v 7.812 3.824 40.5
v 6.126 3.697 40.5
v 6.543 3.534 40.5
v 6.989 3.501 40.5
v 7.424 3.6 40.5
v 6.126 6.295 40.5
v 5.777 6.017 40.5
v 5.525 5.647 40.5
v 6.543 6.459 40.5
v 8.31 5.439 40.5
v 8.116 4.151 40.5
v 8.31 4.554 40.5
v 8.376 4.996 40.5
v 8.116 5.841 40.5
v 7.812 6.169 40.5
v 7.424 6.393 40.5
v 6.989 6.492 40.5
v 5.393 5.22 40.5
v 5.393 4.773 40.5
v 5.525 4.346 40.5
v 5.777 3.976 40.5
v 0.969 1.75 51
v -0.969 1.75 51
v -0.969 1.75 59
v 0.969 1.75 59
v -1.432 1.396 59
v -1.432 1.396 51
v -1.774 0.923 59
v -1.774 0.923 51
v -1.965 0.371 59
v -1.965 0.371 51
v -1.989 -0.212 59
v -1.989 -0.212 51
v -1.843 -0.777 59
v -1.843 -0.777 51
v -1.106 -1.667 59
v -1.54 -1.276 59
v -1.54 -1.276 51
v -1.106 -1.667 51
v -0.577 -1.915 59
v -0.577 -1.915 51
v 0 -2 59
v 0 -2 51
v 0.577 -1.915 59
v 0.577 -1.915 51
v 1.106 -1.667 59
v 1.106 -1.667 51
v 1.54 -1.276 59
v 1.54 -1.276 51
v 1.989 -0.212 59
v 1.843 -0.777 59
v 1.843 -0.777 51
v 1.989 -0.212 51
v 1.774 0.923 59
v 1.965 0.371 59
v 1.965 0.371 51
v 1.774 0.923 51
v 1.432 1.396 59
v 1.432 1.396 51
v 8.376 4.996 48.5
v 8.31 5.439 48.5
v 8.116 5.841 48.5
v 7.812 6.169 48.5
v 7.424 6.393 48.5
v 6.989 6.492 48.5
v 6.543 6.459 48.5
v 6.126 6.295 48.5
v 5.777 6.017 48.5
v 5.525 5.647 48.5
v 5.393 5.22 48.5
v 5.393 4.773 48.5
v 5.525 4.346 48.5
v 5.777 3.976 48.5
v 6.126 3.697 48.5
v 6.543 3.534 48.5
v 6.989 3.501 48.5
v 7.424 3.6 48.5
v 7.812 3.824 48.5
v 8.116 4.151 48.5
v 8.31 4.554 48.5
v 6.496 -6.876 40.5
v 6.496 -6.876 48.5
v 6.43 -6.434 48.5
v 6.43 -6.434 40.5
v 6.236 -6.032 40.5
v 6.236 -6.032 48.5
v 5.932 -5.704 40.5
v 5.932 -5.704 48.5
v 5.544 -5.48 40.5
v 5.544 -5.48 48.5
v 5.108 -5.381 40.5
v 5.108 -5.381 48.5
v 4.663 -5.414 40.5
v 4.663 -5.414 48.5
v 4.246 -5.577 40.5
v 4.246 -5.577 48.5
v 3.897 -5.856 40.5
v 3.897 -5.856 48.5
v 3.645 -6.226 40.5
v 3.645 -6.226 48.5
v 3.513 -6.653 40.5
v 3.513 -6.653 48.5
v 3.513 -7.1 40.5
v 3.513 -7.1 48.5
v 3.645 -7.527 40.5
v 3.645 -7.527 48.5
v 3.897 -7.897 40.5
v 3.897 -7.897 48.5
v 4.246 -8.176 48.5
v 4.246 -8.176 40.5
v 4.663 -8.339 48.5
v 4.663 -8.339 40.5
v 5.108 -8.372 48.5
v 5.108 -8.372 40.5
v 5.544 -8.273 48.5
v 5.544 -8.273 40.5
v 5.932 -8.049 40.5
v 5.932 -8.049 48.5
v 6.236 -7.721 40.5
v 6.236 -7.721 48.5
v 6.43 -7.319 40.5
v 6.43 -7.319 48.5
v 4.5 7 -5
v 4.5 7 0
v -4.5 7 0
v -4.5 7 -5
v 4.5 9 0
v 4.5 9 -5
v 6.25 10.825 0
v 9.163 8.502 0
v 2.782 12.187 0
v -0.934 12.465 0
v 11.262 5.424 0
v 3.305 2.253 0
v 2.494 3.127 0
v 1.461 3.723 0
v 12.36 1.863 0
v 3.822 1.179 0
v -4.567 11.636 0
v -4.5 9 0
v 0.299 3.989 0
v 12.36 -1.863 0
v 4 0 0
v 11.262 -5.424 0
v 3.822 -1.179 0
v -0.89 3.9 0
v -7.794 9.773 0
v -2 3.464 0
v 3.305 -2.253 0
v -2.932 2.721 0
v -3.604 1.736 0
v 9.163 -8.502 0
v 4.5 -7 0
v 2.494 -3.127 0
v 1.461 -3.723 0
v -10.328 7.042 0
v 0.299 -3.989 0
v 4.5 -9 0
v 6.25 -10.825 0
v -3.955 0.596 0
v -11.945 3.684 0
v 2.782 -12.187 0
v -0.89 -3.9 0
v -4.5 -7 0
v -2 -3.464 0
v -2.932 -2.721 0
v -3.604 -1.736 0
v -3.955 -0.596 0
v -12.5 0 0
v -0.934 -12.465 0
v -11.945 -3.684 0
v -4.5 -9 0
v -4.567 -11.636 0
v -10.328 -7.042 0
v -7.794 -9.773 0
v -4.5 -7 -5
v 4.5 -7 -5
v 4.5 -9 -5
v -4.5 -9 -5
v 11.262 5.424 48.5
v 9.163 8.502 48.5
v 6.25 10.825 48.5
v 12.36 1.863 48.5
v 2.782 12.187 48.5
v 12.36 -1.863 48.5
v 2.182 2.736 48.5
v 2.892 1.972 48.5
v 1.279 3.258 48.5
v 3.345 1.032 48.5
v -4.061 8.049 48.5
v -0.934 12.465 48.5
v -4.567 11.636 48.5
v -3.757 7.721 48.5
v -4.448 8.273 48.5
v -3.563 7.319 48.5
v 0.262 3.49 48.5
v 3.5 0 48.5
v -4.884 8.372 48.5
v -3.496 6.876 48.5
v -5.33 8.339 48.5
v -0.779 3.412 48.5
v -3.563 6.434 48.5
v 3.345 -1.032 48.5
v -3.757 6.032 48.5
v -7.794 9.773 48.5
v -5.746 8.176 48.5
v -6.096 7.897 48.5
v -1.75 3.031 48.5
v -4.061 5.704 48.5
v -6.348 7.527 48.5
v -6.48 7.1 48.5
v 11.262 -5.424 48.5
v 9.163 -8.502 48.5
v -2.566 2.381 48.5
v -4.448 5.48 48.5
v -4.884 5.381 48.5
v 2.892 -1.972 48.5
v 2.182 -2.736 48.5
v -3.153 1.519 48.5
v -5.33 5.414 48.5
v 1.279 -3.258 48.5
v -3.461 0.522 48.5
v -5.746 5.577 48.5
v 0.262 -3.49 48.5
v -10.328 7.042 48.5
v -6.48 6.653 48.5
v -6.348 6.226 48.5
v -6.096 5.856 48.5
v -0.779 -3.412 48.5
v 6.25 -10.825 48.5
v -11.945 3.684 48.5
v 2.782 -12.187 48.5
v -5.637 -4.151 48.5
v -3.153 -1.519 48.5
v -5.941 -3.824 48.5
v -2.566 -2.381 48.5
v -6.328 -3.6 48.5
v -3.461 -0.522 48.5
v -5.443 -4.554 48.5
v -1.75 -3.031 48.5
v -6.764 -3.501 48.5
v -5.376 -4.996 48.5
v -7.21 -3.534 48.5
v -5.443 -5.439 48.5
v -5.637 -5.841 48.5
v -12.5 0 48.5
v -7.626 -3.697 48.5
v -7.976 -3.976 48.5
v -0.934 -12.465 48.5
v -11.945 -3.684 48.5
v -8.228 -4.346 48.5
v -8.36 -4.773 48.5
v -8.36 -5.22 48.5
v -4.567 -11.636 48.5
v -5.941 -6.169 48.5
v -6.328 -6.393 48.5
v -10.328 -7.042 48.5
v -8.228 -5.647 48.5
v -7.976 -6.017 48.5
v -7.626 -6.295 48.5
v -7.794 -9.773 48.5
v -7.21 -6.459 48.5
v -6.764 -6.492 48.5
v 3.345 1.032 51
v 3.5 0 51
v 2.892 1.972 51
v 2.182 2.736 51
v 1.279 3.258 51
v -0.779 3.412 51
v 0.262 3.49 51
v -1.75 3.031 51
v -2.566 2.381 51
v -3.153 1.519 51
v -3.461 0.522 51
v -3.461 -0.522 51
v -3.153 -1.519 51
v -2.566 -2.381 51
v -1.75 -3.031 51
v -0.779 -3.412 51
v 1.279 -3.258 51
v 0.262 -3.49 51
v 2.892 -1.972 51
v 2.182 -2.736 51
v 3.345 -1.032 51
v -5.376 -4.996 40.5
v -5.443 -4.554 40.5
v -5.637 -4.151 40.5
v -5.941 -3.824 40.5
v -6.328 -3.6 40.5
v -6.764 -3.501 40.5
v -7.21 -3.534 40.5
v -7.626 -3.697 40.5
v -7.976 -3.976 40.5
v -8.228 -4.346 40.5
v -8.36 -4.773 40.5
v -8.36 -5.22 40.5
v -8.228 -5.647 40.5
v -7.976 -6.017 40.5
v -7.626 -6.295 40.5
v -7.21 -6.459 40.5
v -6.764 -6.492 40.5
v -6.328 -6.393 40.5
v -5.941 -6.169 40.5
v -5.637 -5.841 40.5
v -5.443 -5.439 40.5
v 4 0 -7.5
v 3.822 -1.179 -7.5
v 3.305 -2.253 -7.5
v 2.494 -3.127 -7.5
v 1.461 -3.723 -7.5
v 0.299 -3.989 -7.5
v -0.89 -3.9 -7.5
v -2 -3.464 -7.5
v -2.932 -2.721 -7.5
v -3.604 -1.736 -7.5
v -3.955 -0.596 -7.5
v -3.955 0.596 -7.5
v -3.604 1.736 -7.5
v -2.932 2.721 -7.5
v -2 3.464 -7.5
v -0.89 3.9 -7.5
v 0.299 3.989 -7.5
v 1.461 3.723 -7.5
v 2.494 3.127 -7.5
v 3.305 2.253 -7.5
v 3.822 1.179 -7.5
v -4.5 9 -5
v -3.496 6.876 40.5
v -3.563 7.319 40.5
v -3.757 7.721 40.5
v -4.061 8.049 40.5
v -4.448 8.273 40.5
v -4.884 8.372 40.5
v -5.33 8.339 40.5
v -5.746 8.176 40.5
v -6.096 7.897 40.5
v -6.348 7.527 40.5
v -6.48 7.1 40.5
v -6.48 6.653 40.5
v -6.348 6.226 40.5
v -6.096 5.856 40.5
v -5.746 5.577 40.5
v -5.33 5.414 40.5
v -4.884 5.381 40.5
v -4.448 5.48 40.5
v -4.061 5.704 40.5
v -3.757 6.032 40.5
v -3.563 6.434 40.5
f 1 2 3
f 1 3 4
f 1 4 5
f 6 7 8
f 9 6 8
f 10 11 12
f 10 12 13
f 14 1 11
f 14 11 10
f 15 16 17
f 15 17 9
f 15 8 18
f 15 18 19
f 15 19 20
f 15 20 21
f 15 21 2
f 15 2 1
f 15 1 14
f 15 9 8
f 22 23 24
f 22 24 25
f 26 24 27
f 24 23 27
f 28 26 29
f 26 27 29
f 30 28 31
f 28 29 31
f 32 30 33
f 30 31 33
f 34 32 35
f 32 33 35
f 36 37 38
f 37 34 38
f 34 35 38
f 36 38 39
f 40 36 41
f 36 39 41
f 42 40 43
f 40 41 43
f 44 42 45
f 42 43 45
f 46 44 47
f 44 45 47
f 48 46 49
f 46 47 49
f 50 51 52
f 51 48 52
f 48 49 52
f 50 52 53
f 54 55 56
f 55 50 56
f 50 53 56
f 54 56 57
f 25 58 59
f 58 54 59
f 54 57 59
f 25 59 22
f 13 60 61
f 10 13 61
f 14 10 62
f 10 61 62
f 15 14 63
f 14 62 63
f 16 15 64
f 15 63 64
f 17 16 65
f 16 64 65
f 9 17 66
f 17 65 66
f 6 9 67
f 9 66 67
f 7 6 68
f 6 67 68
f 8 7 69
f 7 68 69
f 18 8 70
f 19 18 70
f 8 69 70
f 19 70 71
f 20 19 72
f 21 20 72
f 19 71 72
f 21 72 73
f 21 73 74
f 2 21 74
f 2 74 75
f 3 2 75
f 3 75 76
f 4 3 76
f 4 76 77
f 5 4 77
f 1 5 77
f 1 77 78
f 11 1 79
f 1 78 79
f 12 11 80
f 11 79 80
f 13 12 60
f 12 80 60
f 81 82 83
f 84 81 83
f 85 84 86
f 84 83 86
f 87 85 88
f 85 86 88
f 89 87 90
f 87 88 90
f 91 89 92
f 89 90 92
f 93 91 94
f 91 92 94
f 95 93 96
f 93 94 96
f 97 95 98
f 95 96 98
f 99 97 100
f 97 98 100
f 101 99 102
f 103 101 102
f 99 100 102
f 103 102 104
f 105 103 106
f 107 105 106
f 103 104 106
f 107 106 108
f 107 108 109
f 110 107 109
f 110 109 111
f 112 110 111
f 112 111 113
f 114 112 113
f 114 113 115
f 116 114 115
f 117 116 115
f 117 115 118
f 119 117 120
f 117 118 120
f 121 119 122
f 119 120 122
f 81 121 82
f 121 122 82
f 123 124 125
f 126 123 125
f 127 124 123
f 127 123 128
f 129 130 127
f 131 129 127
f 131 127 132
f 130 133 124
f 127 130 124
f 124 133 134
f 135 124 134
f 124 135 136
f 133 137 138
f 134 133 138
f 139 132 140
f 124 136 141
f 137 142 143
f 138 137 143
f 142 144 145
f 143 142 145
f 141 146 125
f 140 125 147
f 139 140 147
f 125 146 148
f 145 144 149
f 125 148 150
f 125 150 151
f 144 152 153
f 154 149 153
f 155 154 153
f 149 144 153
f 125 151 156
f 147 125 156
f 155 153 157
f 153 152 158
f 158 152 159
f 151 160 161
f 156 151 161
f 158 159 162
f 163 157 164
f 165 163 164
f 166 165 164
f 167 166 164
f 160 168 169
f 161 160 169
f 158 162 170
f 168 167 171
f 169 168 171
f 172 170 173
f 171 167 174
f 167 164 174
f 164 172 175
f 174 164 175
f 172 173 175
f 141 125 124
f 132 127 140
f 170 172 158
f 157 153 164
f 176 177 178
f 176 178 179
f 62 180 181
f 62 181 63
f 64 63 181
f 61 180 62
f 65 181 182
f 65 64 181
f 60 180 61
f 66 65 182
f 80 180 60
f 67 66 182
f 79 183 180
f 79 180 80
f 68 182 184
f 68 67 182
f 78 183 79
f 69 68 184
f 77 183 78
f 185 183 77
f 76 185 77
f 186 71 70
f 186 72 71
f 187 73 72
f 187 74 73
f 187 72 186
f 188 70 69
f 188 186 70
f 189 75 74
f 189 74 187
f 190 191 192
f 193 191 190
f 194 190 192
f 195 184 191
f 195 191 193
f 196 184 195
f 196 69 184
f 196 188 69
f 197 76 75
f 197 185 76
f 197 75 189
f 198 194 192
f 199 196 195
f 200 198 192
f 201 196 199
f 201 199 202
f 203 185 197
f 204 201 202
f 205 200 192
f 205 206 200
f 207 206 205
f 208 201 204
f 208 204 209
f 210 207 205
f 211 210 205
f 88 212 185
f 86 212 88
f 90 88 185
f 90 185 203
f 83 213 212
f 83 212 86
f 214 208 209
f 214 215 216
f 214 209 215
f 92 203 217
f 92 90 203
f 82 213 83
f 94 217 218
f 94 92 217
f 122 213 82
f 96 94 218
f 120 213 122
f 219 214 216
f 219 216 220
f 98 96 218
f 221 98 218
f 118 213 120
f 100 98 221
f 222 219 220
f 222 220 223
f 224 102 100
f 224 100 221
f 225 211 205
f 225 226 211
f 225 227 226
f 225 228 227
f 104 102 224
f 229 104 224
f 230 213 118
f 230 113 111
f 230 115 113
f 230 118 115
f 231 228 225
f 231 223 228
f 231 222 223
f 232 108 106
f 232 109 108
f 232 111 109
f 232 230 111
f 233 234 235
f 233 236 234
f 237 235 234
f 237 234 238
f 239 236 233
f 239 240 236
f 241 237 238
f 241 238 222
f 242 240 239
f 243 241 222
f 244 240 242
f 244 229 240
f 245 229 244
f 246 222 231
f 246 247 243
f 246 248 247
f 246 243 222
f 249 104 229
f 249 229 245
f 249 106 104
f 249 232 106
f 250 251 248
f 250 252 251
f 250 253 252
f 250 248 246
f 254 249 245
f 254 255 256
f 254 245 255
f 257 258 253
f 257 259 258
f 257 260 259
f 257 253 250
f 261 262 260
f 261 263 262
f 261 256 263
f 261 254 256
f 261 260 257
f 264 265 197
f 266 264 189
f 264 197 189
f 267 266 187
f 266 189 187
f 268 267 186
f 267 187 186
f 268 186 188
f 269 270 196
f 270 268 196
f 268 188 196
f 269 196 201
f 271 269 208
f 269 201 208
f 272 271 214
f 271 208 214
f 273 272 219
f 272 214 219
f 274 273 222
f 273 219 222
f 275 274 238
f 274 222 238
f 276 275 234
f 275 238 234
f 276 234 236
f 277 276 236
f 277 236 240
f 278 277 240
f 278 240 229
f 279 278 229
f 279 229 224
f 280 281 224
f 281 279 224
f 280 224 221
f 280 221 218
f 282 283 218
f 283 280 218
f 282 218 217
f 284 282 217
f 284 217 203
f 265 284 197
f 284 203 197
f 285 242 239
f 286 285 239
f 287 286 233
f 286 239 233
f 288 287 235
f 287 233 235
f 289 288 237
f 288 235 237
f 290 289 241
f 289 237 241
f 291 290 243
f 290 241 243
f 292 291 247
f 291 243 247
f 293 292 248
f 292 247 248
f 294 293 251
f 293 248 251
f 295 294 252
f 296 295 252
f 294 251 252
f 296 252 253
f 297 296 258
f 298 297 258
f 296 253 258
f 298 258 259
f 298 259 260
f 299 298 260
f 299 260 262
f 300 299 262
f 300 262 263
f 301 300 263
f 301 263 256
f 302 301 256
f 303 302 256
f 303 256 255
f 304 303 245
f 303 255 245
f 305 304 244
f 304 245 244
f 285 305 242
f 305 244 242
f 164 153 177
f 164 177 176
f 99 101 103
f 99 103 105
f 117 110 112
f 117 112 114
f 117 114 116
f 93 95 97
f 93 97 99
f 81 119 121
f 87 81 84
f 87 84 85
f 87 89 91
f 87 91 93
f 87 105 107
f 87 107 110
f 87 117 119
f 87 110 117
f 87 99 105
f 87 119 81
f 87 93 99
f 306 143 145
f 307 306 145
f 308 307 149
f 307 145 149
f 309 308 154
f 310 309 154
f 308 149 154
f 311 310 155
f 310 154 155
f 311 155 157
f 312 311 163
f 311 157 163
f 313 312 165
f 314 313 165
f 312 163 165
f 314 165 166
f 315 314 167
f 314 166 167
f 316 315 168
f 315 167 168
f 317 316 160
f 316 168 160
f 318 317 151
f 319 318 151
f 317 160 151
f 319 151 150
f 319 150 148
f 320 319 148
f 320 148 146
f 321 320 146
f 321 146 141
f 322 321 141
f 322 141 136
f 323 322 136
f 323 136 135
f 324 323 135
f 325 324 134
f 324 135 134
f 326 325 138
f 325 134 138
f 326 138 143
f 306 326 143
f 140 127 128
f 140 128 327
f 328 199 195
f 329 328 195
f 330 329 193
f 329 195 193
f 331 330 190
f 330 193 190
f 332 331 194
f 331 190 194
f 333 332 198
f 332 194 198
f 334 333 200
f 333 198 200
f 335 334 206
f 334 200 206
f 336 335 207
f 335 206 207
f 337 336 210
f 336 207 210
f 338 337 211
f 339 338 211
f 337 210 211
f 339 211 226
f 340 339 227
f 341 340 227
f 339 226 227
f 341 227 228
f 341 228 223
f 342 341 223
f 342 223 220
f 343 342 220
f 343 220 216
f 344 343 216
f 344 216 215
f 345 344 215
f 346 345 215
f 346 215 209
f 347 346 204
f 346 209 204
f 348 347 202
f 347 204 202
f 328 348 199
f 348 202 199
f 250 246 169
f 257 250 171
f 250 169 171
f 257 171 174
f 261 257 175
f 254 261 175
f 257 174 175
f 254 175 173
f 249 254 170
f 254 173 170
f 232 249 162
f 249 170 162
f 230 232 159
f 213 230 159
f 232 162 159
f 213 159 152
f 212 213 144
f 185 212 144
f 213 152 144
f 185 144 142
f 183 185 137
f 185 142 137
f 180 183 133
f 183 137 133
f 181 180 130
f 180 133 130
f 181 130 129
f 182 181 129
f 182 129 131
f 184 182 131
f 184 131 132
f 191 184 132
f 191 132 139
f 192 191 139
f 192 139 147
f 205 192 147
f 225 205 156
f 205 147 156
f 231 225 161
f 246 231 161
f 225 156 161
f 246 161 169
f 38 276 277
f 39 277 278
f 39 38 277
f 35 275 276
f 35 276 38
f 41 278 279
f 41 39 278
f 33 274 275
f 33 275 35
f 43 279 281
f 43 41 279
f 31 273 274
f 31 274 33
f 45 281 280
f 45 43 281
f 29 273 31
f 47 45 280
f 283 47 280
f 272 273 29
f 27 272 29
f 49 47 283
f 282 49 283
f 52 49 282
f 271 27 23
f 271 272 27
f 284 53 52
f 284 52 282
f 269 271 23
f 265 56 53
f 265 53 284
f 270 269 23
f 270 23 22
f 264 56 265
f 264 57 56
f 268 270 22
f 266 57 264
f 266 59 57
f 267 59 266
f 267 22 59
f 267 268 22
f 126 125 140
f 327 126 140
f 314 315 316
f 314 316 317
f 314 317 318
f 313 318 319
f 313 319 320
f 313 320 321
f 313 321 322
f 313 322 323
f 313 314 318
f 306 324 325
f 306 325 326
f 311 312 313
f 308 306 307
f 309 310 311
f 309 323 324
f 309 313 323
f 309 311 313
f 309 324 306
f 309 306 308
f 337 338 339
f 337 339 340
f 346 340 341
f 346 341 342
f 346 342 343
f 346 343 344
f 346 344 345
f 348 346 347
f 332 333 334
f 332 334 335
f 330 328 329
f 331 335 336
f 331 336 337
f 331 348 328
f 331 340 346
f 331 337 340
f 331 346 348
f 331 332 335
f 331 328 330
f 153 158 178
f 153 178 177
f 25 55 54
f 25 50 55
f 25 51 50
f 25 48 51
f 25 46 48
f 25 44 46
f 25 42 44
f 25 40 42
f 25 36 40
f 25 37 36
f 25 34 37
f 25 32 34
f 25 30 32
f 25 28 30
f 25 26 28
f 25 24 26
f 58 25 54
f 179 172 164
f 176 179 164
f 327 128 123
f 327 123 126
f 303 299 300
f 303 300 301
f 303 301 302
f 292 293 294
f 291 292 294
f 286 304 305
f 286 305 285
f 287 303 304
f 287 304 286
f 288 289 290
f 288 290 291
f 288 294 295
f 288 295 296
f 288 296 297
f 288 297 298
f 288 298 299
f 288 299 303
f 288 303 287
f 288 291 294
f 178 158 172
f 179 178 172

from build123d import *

# Parameters (mm, degrees)
SKETCH_1_R          = 12.5
EXTRUDE_1_DEPTH     = 48.5
SKETCH_2_R          = 3.5
EXTRUDE_2_DEPTH     = 2.5
SKETCH_3_R          = 2
EXTRUDE_3_DEPTH     = 8
SKETCH_4_W          = 3.587297211
SKETCH_4_H          = 1.292719716
CUT_EXTRUDE_1_DEPTH = 8
SKETCH_5_R          = 1.5
CUT_EXTRUDE_2_DEPTH = 8
SKETCH_6_R          = 4
EXTRUDE_4_DEPTH     = 7.5
SKETCH_7_W          = 9
SKETCH_7_H          = 2
EXTRUDE_5_DEPTH     = 5


with BuildPart() as part:
    # 草图1 → 凸台-拉伸1 (new body)
    with BuildSketch(Plane.XY):
        with Locations(Location((0, 0, 0), (0, 0, 180))):
            Circle(SKETCH_1_R)
    extrude(amount=EXTRUDE_1_DEPTH)

    # 草图2 → 凸台-拉伸2 (add)
    with BuildSketch(Plane.XY.offset(48.5)):
        Circle(SKETCH_2_R)
    extrude(amount=EXTRUDE_2_DEPTH)

    # 草图3 → 凸台-拉伸3 (add)
    with BuildSketch(Plane.XY.offset(51)):
        Circle(SKETCH_3_R)
    extrude(amount=EXTRUDE_3_DEPTH)

    # 草图4 → 切除-拉伸1 (cut)
    with BuildSketch(Plane.XY.offset(59)):
        with Locations((0.022725356, 2.396212297)):
            Rectangle(SKETCH_4_W, SKETCH_4_H)
    extrude(amount=-CUT_EXTRUDE_1_DEPTH, mode=Mode.SUBTRACT)

    # 草图5 → 切除-拉伸2 (cut)
    with BuildSketch(Plane.XY.offset(48.5)):
        with Locations((4.996399446, -6.876481118)):
            Circle(SKETCH_5_R)
        with Locations((-6.876481118, -4.996399446)):
            Circle(SKETCH_5_R)
        with Locations((-4.996399446, 6.876481118)):
            Circle(SKETCH_5_R)
        with Locations((6.876481118, 4.996399446)):
            Circle(SKETCH_5_R)
    extrude(amount=-CUT_EXTRUDE_2_DEPTH, mode=Mode.SUBTRACT)

    # 草图6 → 凸台-拉伸4 (add)
    with BuildSketch(Plane(origin=(0, 0, 0), x_dir=(-1, 0, 0), z_dir=(0, 0, -1))):
        with Locations(Location((0, 0, 0), (0, 0, 180))):
            Circle(SKETCH_6_R)
    extrude(amount=EXTRUDE_4_DEPTH)

    # 草图7 → 凸台-拉伸5 (add)
    with BuildSketch(Plane(origin=(0, 0, 0), x_dir=(-1, 0, 0), z_dir=(0, 0, -1))):
        with Locations((0, 8)):
            Rectangle(SKETCH_7_W, SKETCH_7_H)
        with Locations((0, -8)):
            Rectangle(SKETCH_7_W, SKETCH_7_H)
    extrude(amount=EXTRUDE_5_DEPTH)


solid = part.part
